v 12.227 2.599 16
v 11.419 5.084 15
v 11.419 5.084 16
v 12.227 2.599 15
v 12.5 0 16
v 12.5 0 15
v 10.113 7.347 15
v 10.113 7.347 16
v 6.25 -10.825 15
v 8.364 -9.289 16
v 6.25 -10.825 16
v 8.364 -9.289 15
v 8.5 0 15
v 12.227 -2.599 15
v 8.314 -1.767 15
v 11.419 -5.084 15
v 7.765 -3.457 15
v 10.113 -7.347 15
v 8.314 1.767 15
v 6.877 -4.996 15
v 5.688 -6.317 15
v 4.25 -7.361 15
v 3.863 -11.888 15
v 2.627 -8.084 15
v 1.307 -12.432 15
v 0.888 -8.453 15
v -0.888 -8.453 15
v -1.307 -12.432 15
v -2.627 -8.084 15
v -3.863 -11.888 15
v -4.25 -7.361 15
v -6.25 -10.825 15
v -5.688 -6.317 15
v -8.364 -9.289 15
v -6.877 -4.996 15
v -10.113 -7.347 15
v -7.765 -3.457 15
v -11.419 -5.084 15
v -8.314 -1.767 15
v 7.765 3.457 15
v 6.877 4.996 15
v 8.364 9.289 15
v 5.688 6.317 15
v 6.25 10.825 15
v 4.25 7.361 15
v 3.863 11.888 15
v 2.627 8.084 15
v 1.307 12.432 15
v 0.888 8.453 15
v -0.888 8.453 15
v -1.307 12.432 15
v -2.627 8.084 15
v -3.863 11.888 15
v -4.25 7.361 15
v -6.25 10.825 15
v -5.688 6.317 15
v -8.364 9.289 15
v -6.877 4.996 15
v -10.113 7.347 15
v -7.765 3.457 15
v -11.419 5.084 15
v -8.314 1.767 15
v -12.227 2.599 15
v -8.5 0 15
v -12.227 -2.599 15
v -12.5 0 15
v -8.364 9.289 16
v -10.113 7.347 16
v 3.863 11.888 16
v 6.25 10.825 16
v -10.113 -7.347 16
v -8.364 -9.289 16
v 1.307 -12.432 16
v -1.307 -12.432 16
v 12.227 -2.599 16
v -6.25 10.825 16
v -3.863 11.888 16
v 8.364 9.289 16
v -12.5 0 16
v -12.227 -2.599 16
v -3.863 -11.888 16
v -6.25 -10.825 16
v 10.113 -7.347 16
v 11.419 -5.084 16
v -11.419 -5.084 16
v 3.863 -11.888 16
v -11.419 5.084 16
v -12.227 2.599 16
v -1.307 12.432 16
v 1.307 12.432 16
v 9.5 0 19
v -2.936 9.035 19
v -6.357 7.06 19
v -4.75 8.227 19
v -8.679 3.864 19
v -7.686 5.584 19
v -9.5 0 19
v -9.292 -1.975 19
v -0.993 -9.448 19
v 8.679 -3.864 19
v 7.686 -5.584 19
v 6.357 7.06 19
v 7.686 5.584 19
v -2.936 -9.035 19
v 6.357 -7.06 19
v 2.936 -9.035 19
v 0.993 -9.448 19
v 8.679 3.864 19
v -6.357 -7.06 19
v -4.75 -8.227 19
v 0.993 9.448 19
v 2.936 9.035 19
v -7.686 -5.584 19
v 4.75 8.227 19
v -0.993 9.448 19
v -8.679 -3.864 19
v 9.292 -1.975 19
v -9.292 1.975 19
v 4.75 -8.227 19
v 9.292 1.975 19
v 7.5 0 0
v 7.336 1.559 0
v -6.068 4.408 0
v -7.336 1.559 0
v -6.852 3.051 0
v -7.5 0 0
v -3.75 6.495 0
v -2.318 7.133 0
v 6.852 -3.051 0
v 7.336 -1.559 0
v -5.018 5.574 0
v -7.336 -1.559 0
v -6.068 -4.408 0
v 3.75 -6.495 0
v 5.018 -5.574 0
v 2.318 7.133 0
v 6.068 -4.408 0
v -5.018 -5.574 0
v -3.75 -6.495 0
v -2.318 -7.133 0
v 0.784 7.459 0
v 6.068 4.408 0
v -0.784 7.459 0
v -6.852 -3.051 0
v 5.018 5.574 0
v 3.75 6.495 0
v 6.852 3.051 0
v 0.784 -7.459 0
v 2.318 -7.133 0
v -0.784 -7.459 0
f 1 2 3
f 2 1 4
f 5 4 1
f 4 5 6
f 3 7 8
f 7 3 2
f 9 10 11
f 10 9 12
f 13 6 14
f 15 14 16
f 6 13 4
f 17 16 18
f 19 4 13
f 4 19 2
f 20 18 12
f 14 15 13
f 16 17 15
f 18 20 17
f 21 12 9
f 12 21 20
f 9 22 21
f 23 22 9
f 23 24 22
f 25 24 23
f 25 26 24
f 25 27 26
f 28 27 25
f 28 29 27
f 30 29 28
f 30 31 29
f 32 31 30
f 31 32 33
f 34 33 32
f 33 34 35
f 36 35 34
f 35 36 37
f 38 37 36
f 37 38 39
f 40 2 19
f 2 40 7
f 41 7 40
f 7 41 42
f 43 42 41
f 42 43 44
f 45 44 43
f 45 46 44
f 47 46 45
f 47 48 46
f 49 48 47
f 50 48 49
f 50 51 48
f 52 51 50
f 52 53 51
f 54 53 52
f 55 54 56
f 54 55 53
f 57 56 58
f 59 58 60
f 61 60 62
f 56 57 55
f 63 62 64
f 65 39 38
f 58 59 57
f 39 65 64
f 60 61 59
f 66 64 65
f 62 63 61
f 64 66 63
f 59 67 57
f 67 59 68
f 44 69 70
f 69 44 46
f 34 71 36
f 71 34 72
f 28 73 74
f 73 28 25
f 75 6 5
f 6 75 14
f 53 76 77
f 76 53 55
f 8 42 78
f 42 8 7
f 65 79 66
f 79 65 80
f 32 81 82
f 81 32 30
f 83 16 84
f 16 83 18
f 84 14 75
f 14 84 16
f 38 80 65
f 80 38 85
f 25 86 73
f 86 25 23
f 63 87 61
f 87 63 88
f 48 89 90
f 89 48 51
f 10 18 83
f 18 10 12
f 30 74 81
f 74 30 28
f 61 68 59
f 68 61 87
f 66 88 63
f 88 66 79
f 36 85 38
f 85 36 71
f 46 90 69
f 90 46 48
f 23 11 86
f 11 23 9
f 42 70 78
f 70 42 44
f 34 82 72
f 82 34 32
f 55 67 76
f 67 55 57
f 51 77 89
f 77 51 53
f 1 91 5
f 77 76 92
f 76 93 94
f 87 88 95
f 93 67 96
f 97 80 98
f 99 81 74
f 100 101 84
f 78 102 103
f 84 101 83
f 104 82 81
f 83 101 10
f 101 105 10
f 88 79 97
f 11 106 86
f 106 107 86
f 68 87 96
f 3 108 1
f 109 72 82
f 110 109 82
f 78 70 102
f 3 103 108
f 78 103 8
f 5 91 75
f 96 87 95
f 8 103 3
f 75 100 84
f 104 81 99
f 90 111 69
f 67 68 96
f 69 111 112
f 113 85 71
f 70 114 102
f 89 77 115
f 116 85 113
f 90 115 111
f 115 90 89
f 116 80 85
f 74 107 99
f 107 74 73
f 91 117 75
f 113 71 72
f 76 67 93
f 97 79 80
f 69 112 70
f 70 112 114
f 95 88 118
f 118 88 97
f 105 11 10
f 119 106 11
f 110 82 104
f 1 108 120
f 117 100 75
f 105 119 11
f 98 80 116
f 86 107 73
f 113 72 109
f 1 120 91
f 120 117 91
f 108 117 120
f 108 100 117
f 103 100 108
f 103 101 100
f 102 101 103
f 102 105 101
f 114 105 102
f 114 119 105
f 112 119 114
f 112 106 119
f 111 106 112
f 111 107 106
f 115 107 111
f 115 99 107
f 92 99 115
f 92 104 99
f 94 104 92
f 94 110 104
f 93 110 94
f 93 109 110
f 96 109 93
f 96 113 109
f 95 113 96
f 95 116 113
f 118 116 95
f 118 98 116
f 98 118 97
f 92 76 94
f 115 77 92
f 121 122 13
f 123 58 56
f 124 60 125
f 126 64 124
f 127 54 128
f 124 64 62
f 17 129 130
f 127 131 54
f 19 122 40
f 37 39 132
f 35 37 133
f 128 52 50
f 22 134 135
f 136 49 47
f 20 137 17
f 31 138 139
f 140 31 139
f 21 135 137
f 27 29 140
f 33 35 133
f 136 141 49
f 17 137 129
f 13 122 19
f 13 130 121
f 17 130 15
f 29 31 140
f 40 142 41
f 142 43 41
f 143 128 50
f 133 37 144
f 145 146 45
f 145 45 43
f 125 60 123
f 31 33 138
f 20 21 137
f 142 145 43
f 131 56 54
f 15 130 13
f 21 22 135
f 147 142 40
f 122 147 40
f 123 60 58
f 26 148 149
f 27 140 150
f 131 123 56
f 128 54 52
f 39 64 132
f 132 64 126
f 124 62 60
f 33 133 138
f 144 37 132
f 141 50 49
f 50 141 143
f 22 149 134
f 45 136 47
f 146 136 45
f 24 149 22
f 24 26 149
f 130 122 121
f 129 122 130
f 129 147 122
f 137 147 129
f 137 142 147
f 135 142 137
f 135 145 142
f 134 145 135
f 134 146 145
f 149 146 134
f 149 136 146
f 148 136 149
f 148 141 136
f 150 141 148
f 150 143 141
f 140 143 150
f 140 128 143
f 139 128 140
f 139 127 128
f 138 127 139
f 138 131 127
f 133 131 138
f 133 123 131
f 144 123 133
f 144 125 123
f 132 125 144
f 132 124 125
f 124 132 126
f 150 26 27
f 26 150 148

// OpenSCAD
$fn = 30;
cylinder(15, r=7.5, r2=8.5);
translate([0, 0, 15]) {
  cylinder(1, r=12.5);
  translate([0, 0, 1])
    cylinder(3, r=12.5, r2=9.5);
}
